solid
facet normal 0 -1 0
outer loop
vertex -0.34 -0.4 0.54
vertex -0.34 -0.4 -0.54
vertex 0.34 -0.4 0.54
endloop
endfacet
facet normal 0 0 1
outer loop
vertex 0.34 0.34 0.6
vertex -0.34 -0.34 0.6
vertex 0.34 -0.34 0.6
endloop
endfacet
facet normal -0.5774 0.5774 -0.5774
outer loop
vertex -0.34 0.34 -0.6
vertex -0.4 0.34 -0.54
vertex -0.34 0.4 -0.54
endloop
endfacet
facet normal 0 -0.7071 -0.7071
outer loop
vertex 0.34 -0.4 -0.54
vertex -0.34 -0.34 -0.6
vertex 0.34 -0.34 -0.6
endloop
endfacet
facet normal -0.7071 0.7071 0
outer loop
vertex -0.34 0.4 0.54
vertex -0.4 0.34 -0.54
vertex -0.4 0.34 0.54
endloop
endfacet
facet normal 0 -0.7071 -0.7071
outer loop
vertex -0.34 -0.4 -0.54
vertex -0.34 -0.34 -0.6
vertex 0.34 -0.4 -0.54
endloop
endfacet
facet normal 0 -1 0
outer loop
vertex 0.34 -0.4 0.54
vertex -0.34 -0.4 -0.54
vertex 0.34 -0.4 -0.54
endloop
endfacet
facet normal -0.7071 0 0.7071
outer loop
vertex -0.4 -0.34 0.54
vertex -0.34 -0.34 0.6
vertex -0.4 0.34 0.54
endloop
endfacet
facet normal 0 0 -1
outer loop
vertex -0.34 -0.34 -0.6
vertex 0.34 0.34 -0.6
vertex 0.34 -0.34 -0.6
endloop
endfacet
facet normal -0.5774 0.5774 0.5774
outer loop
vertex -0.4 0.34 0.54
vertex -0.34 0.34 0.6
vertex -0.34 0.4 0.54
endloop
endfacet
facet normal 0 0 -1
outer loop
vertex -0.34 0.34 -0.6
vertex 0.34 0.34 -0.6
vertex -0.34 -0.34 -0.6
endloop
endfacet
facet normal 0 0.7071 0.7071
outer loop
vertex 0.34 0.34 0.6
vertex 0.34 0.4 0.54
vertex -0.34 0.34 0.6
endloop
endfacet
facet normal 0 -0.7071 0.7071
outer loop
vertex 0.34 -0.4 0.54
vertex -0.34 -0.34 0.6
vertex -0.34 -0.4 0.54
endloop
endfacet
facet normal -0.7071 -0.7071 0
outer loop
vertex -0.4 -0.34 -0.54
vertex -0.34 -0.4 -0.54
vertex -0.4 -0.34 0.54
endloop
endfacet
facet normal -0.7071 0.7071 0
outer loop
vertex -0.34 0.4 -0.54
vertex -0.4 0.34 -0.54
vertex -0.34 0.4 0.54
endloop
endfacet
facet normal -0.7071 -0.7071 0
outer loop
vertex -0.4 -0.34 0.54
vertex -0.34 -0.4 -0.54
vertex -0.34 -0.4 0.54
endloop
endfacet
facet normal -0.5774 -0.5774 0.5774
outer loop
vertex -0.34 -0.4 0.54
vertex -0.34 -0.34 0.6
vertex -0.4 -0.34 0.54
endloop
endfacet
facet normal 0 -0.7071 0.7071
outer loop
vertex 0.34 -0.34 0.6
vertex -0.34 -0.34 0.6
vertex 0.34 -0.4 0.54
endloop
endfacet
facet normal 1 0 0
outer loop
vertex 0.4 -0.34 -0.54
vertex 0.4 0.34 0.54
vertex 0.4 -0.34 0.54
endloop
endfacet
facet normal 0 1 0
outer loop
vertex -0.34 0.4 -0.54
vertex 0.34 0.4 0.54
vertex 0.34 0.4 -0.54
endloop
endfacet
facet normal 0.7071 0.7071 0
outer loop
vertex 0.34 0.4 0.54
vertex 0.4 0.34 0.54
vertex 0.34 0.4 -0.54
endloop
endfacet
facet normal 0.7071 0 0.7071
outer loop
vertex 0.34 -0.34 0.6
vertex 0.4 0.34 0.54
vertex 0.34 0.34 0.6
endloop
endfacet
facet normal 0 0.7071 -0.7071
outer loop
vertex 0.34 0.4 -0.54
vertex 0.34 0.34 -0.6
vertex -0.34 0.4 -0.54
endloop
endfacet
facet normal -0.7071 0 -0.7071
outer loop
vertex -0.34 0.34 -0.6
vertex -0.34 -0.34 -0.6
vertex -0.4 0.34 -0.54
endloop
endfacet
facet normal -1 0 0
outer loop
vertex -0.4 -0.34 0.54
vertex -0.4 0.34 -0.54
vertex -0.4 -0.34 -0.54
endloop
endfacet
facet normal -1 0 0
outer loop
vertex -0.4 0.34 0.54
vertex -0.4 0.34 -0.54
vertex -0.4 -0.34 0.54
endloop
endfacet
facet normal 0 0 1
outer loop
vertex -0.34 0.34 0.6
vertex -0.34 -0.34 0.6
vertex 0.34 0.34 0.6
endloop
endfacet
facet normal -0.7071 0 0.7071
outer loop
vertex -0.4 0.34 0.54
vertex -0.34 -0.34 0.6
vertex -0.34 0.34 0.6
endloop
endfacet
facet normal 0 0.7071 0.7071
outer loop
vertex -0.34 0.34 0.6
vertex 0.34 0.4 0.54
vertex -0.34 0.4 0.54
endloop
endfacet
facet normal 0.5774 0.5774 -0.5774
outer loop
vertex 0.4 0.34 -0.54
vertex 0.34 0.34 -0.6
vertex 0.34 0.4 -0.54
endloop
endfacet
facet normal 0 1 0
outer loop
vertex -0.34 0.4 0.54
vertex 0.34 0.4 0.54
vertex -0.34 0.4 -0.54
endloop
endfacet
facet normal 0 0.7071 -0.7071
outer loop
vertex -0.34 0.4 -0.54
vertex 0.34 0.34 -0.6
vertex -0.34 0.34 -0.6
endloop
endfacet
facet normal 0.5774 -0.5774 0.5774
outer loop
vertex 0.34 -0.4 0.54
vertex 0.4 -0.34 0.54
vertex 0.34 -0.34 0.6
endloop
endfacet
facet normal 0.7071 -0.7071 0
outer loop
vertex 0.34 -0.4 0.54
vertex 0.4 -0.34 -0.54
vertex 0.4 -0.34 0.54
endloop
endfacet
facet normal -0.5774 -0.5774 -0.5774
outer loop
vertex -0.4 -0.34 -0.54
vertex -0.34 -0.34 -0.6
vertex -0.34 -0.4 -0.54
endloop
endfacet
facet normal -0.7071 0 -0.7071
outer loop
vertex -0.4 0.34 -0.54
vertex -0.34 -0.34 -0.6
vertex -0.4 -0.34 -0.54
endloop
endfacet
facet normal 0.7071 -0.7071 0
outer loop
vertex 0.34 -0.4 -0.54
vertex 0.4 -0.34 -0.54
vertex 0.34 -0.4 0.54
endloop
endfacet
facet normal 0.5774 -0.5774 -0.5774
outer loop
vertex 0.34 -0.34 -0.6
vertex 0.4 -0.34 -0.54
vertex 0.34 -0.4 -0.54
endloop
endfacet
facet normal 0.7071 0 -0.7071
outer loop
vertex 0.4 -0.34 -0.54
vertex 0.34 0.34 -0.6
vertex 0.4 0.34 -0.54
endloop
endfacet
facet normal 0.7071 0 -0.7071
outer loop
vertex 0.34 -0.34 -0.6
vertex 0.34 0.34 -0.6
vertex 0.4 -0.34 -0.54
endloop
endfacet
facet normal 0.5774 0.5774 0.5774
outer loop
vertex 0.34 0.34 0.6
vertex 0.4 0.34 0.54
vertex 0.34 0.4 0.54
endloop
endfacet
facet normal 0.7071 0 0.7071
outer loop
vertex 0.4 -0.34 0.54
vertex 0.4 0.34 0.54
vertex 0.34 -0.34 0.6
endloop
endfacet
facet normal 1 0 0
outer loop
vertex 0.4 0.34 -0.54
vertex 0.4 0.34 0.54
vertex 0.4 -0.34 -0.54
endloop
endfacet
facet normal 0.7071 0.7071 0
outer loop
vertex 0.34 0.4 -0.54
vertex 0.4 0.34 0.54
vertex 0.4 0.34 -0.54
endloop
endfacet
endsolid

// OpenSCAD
$fn=64;

module chamfered_block(size=[0.8,0.8,1.2], chamfer=0.06){
    x=size[0]; y=size[1]; z=size[2];
    c=min(chamfer, x/2, y/2, z/2);
    minkowski(){
        cube([x-2*c, y-2*c, z-2*c], center=true);
        octahedron(c);
    }
}

module octahedron(r){
    polyhedron(
        points=[
            [ r, 0, 0],
            [-r, 0, 0],
            [ 0, r, 0],
            [ 0,-r, 0],
            [ 0, 0, r],
            [ 0, 0,-r]
        ],
        faces=[
            [0,2,4],
            [2,1,4],
            [1,3,4],
            [3,0,4],
            [2,0,5],
            [1,2,5],
            [3,1,5],
            [0,3,5]
        ]
    );
}

chamfered_block([0.8,0.8,1.2], 0.06);
